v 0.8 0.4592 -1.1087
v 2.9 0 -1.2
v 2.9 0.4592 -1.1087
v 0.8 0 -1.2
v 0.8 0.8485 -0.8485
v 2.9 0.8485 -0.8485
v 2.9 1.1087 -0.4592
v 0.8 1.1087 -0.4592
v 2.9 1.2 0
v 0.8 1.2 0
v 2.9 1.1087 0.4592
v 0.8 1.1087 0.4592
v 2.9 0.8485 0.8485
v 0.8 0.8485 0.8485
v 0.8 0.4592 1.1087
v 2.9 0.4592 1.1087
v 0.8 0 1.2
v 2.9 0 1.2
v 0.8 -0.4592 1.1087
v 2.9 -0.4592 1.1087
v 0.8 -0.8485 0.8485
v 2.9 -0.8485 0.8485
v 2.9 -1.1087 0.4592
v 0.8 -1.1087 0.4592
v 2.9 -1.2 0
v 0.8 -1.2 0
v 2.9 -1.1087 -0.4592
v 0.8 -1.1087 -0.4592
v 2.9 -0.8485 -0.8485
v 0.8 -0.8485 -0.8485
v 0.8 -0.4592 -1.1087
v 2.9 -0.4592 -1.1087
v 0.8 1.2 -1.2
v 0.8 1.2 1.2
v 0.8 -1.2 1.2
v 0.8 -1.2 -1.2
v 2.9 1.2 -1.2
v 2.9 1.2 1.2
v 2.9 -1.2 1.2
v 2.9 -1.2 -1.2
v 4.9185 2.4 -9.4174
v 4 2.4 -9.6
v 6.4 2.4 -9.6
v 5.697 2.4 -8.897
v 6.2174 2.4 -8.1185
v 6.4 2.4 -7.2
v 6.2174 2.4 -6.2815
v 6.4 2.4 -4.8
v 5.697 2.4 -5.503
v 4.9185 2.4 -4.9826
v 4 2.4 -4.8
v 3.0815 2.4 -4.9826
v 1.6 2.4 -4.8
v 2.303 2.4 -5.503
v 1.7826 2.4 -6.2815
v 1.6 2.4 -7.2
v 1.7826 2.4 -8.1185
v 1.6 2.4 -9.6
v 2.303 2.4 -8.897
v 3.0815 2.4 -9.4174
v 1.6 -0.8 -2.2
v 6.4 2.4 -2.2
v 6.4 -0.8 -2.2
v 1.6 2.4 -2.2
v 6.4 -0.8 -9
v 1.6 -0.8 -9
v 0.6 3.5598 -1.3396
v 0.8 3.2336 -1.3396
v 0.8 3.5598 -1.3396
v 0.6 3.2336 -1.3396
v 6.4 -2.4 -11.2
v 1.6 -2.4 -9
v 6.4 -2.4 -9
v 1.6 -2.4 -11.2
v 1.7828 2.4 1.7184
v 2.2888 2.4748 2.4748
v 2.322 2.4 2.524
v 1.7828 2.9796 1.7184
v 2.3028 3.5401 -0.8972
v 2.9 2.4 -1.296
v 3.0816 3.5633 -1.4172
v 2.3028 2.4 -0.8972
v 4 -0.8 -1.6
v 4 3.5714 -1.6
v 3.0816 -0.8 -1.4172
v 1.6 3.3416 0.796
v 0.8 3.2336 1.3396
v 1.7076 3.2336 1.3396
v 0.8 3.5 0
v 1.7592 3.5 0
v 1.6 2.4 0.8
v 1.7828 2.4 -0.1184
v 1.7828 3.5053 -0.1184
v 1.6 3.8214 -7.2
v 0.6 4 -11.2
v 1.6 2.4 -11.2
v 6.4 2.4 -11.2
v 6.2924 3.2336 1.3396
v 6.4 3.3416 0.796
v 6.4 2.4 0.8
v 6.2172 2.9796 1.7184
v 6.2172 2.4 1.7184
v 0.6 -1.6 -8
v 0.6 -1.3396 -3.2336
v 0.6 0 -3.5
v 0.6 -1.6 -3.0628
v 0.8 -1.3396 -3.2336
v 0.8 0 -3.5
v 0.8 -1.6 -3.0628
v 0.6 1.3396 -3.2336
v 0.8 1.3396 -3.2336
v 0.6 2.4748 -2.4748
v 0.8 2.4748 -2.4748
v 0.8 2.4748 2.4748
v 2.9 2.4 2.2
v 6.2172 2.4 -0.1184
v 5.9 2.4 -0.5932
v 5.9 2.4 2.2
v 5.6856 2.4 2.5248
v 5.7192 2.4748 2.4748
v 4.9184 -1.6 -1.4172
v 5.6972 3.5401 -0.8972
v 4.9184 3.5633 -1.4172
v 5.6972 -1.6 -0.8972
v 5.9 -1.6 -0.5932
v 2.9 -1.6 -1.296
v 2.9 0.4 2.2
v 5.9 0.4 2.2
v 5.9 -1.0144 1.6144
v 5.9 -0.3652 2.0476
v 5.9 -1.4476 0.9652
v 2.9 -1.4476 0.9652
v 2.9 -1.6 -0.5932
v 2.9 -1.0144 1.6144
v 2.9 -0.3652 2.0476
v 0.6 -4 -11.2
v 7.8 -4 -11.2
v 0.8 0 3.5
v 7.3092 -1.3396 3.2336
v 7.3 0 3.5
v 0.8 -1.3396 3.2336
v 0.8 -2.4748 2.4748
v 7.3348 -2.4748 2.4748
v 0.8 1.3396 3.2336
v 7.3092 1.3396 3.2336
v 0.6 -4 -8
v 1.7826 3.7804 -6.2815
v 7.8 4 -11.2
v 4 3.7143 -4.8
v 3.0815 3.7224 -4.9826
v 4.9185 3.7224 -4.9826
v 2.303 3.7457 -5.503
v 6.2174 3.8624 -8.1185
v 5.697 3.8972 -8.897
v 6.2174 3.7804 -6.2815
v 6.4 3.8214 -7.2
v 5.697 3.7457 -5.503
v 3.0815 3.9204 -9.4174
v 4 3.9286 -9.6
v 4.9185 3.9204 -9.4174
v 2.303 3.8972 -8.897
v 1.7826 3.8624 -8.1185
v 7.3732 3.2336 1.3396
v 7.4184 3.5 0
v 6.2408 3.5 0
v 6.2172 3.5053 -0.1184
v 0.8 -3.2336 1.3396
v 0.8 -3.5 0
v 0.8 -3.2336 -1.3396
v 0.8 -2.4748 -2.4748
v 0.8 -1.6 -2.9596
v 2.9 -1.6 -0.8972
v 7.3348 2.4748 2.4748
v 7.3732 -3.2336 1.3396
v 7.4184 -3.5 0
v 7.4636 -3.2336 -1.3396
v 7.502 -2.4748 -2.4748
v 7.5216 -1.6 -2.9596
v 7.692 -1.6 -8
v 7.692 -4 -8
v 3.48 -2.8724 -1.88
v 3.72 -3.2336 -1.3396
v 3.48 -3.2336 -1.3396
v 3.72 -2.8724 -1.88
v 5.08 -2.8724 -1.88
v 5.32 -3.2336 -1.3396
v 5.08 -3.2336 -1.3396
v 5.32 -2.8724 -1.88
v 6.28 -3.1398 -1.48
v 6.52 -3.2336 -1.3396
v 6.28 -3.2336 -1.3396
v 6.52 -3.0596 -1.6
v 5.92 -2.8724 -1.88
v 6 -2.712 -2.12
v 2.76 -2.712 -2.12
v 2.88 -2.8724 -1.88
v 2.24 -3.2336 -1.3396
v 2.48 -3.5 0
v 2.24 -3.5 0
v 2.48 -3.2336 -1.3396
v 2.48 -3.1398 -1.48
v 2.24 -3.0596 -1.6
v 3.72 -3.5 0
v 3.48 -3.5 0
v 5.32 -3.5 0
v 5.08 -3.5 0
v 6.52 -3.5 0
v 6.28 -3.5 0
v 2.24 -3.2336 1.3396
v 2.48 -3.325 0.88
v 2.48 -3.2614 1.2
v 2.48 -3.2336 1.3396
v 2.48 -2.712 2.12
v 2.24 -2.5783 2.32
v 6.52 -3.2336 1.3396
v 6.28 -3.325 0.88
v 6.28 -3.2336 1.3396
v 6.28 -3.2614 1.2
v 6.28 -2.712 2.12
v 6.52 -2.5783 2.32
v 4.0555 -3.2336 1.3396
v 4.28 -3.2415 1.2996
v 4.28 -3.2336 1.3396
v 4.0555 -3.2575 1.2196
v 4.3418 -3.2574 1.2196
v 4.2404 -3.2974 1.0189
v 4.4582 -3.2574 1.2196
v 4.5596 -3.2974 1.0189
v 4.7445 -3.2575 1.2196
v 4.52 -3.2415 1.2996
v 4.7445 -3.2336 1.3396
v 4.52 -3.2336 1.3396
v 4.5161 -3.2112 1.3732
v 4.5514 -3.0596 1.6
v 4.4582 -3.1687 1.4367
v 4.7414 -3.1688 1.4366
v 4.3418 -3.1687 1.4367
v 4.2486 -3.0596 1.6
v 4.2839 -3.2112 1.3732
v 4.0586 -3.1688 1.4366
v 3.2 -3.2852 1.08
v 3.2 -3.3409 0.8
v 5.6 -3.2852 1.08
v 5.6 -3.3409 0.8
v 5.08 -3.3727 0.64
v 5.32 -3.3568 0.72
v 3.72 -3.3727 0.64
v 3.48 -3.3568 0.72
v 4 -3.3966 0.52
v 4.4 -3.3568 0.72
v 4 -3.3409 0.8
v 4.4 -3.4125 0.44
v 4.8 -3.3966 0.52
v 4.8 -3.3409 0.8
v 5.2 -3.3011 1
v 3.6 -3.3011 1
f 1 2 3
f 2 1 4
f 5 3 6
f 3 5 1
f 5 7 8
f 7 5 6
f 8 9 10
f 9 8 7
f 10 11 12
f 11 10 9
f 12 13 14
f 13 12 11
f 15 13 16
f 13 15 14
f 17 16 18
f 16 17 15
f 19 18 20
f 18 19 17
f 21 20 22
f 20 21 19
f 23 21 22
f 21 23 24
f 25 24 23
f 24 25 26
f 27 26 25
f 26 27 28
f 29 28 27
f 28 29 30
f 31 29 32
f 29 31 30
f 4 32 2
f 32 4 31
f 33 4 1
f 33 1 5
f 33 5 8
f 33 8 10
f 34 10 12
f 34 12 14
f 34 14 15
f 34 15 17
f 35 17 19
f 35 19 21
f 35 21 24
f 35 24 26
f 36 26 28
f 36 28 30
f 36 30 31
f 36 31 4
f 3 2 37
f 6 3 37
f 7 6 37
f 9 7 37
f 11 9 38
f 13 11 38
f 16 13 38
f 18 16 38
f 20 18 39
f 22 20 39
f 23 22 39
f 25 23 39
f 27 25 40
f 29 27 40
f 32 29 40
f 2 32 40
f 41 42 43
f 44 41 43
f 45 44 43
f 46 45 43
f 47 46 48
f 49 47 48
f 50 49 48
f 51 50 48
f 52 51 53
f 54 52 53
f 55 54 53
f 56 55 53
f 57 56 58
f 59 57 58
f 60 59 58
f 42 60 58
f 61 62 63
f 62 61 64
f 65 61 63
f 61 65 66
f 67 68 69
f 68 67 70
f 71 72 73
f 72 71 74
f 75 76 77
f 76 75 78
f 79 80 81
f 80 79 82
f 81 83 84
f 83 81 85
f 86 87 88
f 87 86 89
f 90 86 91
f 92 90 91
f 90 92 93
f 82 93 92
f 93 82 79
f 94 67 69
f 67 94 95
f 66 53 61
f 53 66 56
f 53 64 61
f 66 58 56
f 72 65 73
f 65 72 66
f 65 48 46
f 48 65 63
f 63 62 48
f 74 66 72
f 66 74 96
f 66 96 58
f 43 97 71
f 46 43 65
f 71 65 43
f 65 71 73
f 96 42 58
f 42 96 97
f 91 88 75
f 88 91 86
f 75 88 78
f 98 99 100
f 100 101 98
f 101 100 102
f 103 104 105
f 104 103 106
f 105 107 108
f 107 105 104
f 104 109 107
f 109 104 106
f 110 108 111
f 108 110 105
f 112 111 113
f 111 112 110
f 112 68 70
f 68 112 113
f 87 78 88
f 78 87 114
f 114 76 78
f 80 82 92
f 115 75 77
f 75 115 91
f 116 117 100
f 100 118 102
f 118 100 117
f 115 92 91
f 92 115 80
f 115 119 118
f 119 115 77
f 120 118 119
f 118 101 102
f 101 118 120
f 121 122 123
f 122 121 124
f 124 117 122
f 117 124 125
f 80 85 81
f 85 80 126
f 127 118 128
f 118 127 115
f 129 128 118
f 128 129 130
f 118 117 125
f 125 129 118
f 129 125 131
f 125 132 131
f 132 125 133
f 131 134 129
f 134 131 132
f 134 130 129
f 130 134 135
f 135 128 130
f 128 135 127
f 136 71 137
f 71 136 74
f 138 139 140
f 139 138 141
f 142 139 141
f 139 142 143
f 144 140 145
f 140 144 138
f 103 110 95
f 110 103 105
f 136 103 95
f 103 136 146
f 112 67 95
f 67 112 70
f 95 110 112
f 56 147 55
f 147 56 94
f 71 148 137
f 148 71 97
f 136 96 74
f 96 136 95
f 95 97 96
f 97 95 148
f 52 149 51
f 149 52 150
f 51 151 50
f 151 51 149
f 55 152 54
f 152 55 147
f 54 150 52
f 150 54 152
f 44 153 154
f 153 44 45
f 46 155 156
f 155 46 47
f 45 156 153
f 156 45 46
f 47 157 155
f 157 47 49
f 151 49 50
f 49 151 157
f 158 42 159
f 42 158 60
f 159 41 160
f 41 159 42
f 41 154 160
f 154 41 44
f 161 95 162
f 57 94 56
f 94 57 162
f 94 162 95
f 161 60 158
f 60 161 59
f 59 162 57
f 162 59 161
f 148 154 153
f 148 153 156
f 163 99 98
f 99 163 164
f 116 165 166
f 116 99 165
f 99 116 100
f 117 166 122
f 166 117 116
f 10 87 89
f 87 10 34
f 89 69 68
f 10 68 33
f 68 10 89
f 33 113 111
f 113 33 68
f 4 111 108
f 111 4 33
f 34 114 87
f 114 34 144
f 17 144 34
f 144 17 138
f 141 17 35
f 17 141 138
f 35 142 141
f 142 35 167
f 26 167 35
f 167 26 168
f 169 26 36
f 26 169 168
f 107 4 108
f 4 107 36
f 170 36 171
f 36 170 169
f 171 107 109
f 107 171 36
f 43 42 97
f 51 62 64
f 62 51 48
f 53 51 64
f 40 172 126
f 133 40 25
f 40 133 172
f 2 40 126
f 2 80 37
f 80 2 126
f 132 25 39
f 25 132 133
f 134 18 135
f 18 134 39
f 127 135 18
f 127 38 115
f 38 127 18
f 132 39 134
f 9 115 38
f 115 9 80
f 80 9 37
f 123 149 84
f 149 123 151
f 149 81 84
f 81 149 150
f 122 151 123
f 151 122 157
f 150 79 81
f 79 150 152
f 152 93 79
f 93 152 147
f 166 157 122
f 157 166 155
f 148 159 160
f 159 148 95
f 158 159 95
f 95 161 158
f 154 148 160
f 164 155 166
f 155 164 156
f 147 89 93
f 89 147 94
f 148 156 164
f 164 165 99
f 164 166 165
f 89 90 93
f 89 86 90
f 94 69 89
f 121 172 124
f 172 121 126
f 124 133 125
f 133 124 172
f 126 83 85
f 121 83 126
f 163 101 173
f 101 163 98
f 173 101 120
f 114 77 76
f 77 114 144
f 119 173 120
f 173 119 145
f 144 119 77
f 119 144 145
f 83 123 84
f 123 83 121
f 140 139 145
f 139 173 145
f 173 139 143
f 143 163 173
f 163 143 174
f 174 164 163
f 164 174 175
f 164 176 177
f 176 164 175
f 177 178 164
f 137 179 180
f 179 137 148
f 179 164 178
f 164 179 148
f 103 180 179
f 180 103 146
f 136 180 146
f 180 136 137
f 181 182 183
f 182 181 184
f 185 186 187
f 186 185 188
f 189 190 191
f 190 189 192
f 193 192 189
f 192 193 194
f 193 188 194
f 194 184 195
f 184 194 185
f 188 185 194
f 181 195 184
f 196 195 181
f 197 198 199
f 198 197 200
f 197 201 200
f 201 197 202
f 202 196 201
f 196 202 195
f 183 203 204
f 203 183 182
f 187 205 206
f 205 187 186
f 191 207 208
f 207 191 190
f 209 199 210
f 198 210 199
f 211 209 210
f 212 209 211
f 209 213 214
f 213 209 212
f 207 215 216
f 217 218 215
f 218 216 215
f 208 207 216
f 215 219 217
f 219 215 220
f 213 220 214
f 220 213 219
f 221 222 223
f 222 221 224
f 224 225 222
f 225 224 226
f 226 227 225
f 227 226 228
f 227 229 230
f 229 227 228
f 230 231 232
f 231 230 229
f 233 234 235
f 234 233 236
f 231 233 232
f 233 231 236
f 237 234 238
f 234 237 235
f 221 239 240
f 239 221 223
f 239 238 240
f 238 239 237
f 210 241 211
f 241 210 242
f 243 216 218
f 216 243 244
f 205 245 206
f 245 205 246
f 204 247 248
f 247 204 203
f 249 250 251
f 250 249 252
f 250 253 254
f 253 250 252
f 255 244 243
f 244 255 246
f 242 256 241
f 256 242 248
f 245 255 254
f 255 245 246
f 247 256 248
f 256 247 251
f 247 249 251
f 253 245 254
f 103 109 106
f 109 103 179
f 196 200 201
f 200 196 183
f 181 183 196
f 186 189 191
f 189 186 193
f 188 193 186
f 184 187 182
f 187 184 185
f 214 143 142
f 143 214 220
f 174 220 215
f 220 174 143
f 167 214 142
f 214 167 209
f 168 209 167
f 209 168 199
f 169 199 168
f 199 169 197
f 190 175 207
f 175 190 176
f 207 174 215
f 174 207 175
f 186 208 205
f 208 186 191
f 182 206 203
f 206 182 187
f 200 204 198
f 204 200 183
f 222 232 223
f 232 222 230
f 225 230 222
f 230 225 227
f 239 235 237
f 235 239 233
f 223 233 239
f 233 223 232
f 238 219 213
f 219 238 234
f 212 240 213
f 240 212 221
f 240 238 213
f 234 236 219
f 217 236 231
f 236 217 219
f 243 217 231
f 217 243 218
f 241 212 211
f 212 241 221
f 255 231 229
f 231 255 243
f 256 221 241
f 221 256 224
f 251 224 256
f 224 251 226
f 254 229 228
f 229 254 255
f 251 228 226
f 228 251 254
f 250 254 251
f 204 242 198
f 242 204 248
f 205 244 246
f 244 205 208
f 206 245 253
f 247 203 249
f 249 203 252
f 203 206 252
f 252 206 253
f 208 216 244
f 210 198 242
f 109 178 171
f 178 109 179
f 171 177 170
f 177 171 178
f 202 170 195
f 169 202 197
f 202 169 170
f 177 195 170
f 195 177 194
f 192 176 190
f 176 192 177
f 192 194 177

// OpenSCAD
use <../lib.scad>
use <s/3817bs01.scad>
$fa=1; $fs=0.2;
function ldraw_lib__3817bpa3(realsolid=false) = [
// 0 Minifig Leg Left with Buttoned Cargo Pocket Pattern
// 0 Name: 3817bpa3.dat
// 0 Author: Magnus Forsberg [MagFors]
// 0 !LDRAW_ORG Part UPDATE 2020-03
// 0 !LICENSE Licensed under CC BY 2.0 and CC BY 4.0 : see CAreadme.txt
// 
// 0 BFC CERTIFY CCW
  [0,"BFC","CERTIFY"],
  [0,"BFC","CCW"],
// 
// 0 !KEYWORDS Bricklink 970c00pb0018, Johnny Thunder
// 
// 0 !CMDLINE -c19
// 
// 0 !HISTORY 2009-12-29 [westrate] Original design as 3817pa3
// 0 !HISTORY 2020-06-27 [MagFors] Adapted to corrected geometry
// 0 !HISTORY 2020-12-29 [PTadmin] Official Update 2020-03
// 
// 
// 1 16 0 0 0 1 0 0 0 1 0 0 0 1 s\3817bs01.dat
  [1,16,0,0,0,1,0,0,0,1,0,0,0,1, ldraw_lib__s__3817bs01(realsolid)],
// 4 16 1.5 20 -4 1.5 20 -10 19.23 20 -10 19.23 20 -4
  [4,16,1.5,20,-4,1.5,20,-10,19.23,20,-10,19.23,20,-4],
// 4 16 1.5 20 -10 1.5 28 -10 19.5 28 -10 19.23 20 -10
  [4,16,1.5,20,-10,1.5,28,-10,19.5,28,-10,19.23,20,-10],
// 5 24 2 3.349 -8.084 18.659 3.349 -8.084 2 0 -8.75 2 6.187 -6.187
  [5,24,2,3.349,-8.084,18.659,3.349,-8.084,2,0,-8.75,2,6.187,-6.187],
// 5 24 2 6.187 -6.187 18.755 6.187 -6.187 2 7.399 -4 2 3.349 -8.084
  [5,24,2,6.187,-6.187,18.755,6.187,-6.187,2,7.399,-4,2,3.349,-8.084],
// 5 24 2 0 -8.75 18.546 0 -8.75 2 3.349 -8.084 2 -3.349 -8.084
  [5,24,2,0,-8.75,18.546,0,-8.75,2,3.349,-8.084,2,-3.349,-8.084],
// 5 24 2 -3.349 -8.084 18.433 -3.349 -8.084 2 0 -8.75 2 -6.187 -6.187
  [5,24,2,-3.349,-8.084,18.433,-3.349,-8.084,2,0,-8.75,2,-6.187,-6.187],
// 
// 4 0 9.3 3.349 -8.084 8.7 3.349 -8.084 8.7 4.7 -7.181 9.3 4.7 -7.181
  [4,0,9.3,3.349,-8.084,8.7,3.349,-8.084,8.7,4.7,-7.181,9.3,4.7,-7.181],
// 4 0 13.3 4.7 -7.181 13.3 3.349 -8.084 12.7 3.349 -8.084 12.7 4.7 -7.181
  [4,0,13.3,4.7,-7.181,13.3,3.349,-8.084,12.7,3.349,-8.084,12.7,4.7,-7.181],
// 4 0 15.7 3.349 -8.084 15.7 3.7 -7.8494 16.3 4 -7.6489 16.3 3.349 -8.084
  [4,0,15.7,3.349,-8.084,15.7,3.7,-7.8494,16.3,4,-7.6489,16.3,3.349,-8.084],
// 4 0 14.8 4.7 -7.181 15 5.3 -6.7799 16.3 4 -7.6489 15.7 3.7 -7.8494
  [4,0,14.8,4.7,-7.181,15,5.3,-6.7799,16.3,4,-7.6489,15.7,3.7,-7.8494],
// 3 0 14.8 4.7 -7.181 13.3 4.7 -7.181 15 5.3 -6.7799
  [3,0,14.8,4.7,-7.181,13.3,4.7,-7.181,15,5.3,-6.7799],
// 4 0 6.9 5.3 -6.7799 15 5.3 -6.7799 12.7 4.7 -7.181 9.3 4.7 -7.181
  [4,0,6.9,5.3,-6.7799,15,5.3,-6.7799,12.7,4.7,-7.181,9.3,4.7,-7.181],
// 3 0 13.3 4.7 -7.181 12.7 4.7 -7.181 15 5.3 -6.7799
  [3,0,13.3,4.7,-7.181,12.7,4.7,-7.181,15,5.3,-6.7799],
// 3 0 8.7 4.7 -7.181 6.9 5.3 -6.7799 9.3 4.7 -7.181
  [3,0,8.7,4.7,-7.181,6.9,5.3,-6.7799,9.3,4.7,-7.181],
// 3 0 7.2 4.7 -7.181 6.9 5.3 -6.7799 8.7 4.7 -7.181
  [3,0,7.2,4.7,-7.181,6.9,5.3,-6.7799,8.7,4.7,-7.181],
// 4 0 5.6 0 -8.75 5.6 3.349 -8.084 6.2 3.349 -8.084 6.2 0 -8.75
  [4,0,5.6,0,-8.75,5.6,3.349,-8.084,6.2,3.349,-8.084,6.2,0,-8.75],
// 4 0 5.6 4 -7.6489 6.2 3.7 -7.8494 6.2 3.349 -8.084 5.6 3.349 -8.084
  [4,0,5.6,4,-7.6489,6.2,3.7,-7.8494,6.2,3.349,-8.084,5.6,3.349,-8.084],
// 4 0 7.2 4.7 -7.181 6.2 3.7 -7.8494 5.6 4 -7.6489 6.9 5.3 -6.7799
  [4,0,7.2,4.7,-7.181,6.2,3.7,-7.8494,5.6,4,-7.6489,6.9,5.3,-6.7799],
// 4 0 8.7 0 -8.75 8.7 3.349 -8.084 9.3 3.349 -8.084 9.3 0 -8.75
  [4,0,8.7,0,-8.75,8.7,3.349,-8.084,9.3,3.349,-8.084,9.3,0,-8.75],
// 4 0 13.3 3.349 -8.084 13.3 0 -8.75 12.7 0 -8.75 12.7 3.349 -8.084
  [4,0,13.3,3.349,-8.084,13.3,0,-8.75,12.7,0,-8.75,12.7,3.349,-8.084],
// 4 0 15.7 3.349 -8.084 16.3 3.349 -8.084 16.3 0 -8.75 15.7 0 -8.75
  [4,0,15.7,3.349,-8.084,16.3,3.349,-8.084,16.3,0,-8.75,15.7,0,-8.75],
// 3 0 5.6 -3.349 -8.084 5.6 0 -8.75 6.2 -2.2 -8.3125
  [3,0,5.6,-3.349,-8.084,5.6,0,-8.75,6.2,-2.2,-8.3125],
// 3 0 6.2 0 -8.75 6.2 -2.2 -8.3125 5.6 0 -8.75
  [3,0,6.2,0,-8.75,6.2,-2.2,-8.3125,5.6,0,-8.75],
// 3 0 6.2 -3 -8.1534 5.6 -3.349 -8.084 6.2 -2.2 -8.3125
  [3,0,6.2,-3,-8.1534,5.6,-3.349,-8.084,6.2,-2.2,-8.3125],
// 3 0 6.2 -3.349 -8.084 5.6 -3.349 -8.084 6.2 -3 -8.1534
  [3,0,6.2,-3.349,-8.084,5.6,-3.349,-8.084,6.2,-3,-8.1534],
// 4 0 5.6 -5.8 -6.4457 5.6 -3.349 -8.084 6.2 -3.349 -8.084 6.2 -5.3 -6.7799
  [4,0,5.6,-5.8,-6.4457,5.6,-3.349,-8.084,6.2,-3.349,-8.084,6.2,-5.3,-6.7799],
// 3 0 16.3 0 -8.75 16.3 -3.349 -8.084 15.7 -2.2 -8.3125
  [3,0,16.3,0,-8.75,16.3,-3.349,-8.084,15.7,-2.2,-8.3125],
// 3 0 15.7 -3.349 -8.084 15.7 -3 -8.1534 16.3 -3.349 -8.084
  [3,0,15.7,-3.349,-8.084,15.7,-3,-8.1534,16.3,-3.349,-8.084],
// 3 0 15.7 -3 -8.1534 15.7 -2.2 -8.3125 16.3 -3.349 -8.084
  [3,0,15.7,-3,-8.1534,15.7,-2.2,-8.3125,16.3,-3.349,-8.084],
// 3 0 15.7 0 -8.75 16.3 0 -8.75 15.7 -2.2 -8.3125
  [3,0,15.7,0,-8.75,16.3,0,-8.75,15.7,-2.2,-8.3125],
// 4 0 16.3 -3.349 -8.084 16.3 -5.8 -6.4457 15.7 -5.3 -6.7799 15.7 -3.349 -8.084
  [4,0,16.3,-3.349,-8.084,16.3,-5.8,-6.4457,15.7,-5.3,-6.7799,15.7,-3.349,-8.084],
// 4 0 6.2 -5.3 -6.7799 15.7 -5.3 -6.7799 16.3 -5.8 -6.4457 5.6 -5.8 -6.4457
  [4,0,6.2,-5.3,-6.7799,15.7,-5.3,-6.7799,16.3,-5.8,-6.4457,5.6,-5.8,-6.4457],
// 4 0 10.7 -3.349 -8.084 10.1387 -3.349 -8.084 10.1387 -3.049 -8.1437 10.7 -3.249 -8.1038
  [4,0,10.7,-3.349,-8.084,10.1387,-3.349,-8.084,10.1387,-3.049,-8.1437,10.7,-3.249,-8.1038],
// 4 0 10.7 -3.249 -8.1038 10.1387 -3.049 -8.1437 10.601 -2.5472 -8.2435 10.8545 -3.049 -8.1436
  [4,0,10.7,-3.249,-8.1038,10.1387,-3.049,-8.1437,10.601,-2.5472,-8.2435,10.8545,-3.049,-8.1436],
// 4 0 10.8545 -3.049 -8.1436 10.601 -2.5472 -8.2435 11.399 -2.5472 -8.2435 11.1455 -3.049 -8.1436
  [4,0,10.8545,-3.049,-8.1436,10.601,-2.5472,-8.2435,11.399,-2.5472,-8.2435,11.1455,-3.049,-8.1436],
// 4 0 11.1455 -3.049 -8.1436 11.399 -2.5472 -8.2435 11.8613 -3.049 -8.1437 11.3 -3.249 -8.1038
  [4,0,11.1455,-3.049,-8.1436,11.399,-2.5472,-8.2435,11.8613,-3.049,-8.1437,11.3,-3.249,-8.1038],
// 4 0 11.8613 -3.349 -8.084 11.3 -3.349 -8.084 11.3 -3.249 -8.1038 11.8613 -3.049 -8.1437
  [4,0,11.8613,-3.349,-8.084,11.3,-3.349,-8.084,11.3,-3.249,-8.1038,11.8613,-3.049,-8.1437],
// 4 0 11.2902 -3.4329 -8.0279 11.8536 -3.5914 -7.922 11.3784 -4 -7.6489 11.1455 -3.5917 -7.9218
  [4,0,11.2902,-3.4329,-8.0279,11.8536,-3.5914,-7.922,11.3784,-4,-7.6489,11.1455,-3.5917,-7.9218],
// 4 0 11.8536 -3.5914 -7.922 11.2902 -3.4329 -8.0279 11.3 -3.349 -8.084 11.8613 -3.349 -8.084
  [4,0,11.8536,-3.5914,-7.922,11.2902,-3.4329,-8.0279,11.3,-3.349,-8.084,11.8613,-3.349,-8.084],
// 4 0 11.1455 -3.5917 -7.9218 11.3784 -4 -7.6489 10.6216 -4 -7.6489 10.8545 -3.5917 -7.9218
  [4,0,11.1455,-3.5917,-7.9218,11.3784,-4,-7.6489,10.6216,-4,-7.6489,10.8545,-3.5917,-7.9218],
// 4 0 10.1464 -3.5914 -7.922 10.1387 -3.349 -8.084 10.7 -3.349 -8.084 10.7098 -3.4329 -8.0279
  [4,0,10.1464,-3.5914,-7.922,10.1387,-3.349,-8.084,10.7,-3.349,-8.084,10.7098,-3.4329,-8.0279],
// 4 0 10.6216 -4 -7.6489 10.1464 -3.5914 -7.922 10.7098 -3.4329 -8.0279 10.8545 -3.5917 -7.9218
  [4,0,10.6216,-4,-7.6489,10.1464,-3.5914,-7.922,10.7098,-3.4329,-8.0279,10.8545,-3.5917,-7.9218],
// 4 0 6.2 -2.2 -8.3125 8 -2 -8.3523 8 -2.7 -8.2131 6.2 -3 -8.1534
  [4,0,6.2,-2.2,-8.3125,8,-2,-8.3523,8,-2.7,-8.2131,6.2,-3,-8.1534],
// 4 0 14 -2.7 -8.2131 14 -2 -8.3523 15.7 -2.2 -8.3125 15.7 -3 -8.1534
  [4,0,14,-2.7,-8.2131,14,-2,-8.3523,15.7,-2.2,-8.3125,15.7,-3,-8.1534],
// 4 0 13.3 -1.8 -8.392 12.7 -1.6 -8.4318 12.7 0 -8.75 13.3 0 -8.75
  [4,0,13.3,-1.8,-8.392,12.7,-1.6,-8.4318,12.7,0,-8.75,13.3,0,-8.75],
// 4 0 8.7 0 -8.75 9.3 0 -8.75 9.3 -1.6 -8.4318 8.7 -1.8 -8.392
  [4,0,8.7,0,-8.75,9.3,0,-8.75,9.3,-1.6,-8.4318,8.7,-1.8,-8.392],
// 4 0 10 -1.3 -8.4915 11 -1.1 -8.5312 11 -1.8 -8.392 10 -2 -8.3523
  [4,0,10,-1.3,-8.4915,11,-1.1,-8.5312,11,-1.8,-8.392,10,-2,-8.3523],
// 4 0 11 -1.8 -8.392 11 -1.1 -8.5312 12 -1.3 -8.4915 12 -2 -8.3523
  [4,0,11,-1.8,-8.392,11,-1.1,-8.5312,12,-1.3,-8.4915,12,-2,-8.3523],
// 4 0 13 -2.5 -8.2528 13.3 -1.8 -8.392 14 -2 -8.3523 14 -2.7 -8.2131
  [4,0,13,-2.5,-8.2528,13.3,-1.8,-8.392,14,-2,-8.3523,14,-2.7,-8.2131],
// 4 0 8 -2 -8.3523 8.7 -1.8 -8.392 9 -2.5 -8.2528 8 -2.7 -8.2131
  [4,0,8,-2,-8.3523,8.7,-1.8,-8.392,9,-2.5,-8.2528,8,-2.7,-8.2131],
// 4 0 12 -2 -8.3523 12.7 -1.6 -8.4318 13.3 -1.8 -8.392 13 -2.5 -8.2528
  [4,0,12,-2,-8.3523,12.7,-1.6,-8.4318,13.3,-1.8,-8.392,13,-2.5,-8.2528],
// 4 0 8.7 -1.8 -8.392 9.3 -1.6 -8.4318 10 -2 -8.3523 9 -2.5 -8.2528
  [4,0,8.7,-1.8,-8.392,9.3,-1.6,-8.4318,10,-2,-8.3523,9,-2.5,-8.2528],
// 3 0 9.3 -1.6 -8.4318 10 -1.3 -8.4915 10 -2 -8.3523
  [3,0,9.3,-1.6,-8.4318,10,-1.3,-8.4915,10,-2,-8.3523],
// 3 0 12 -1.3 -8.4915 12.7 -1.6 -8.4318 12 -2 -8.3523
  [3,0,12,-1.3,-8.4915,12.7,-1.6,-8.4318,12,-2,-8.3523],
// 4 16 1.5 20 -4 19.23 20 -4 2 7.657 -4 1.5 7.657 -4
  [4,16,1.5,20,-4,19.23,20,-4,2,7.657,-4,1.5,7.657,-4],
// 4 16 6.2 3.349 -8.084 6.2 3.7 -7.8494 7.2 4.7 -7.181 8.7 3.349 -8.084
  [4,16,6.2,3.349,-8.084,6.2,3.7,-7.8494,7.2,4.7,-7.181,8.7,3.349,-8.084],
// 3 16 8.7 4.7 -7.181 8.7 3.349 -8.084 7.2 4.7 -7.181
  [3,16,8.7,4.7,-7.181,8.7,3.349,-8.084,7.2,4.7,-7.181],
// 4 16 14.8 4.7 -7.181 15.7 3.7 -7.8494 15.7 3.349 -8.084 13.3 3.349 -8.084
  [4,16,14.8,4.7,-7.181,15.7,3.7,-7.8494,15.7,3.349,-8.084,13.3,3.349,-8.084],
// 3 16 13.3 4.7 -7.181 14.8 4.7 -7.181 13.3 3.349 -8.084
  [3,16,13.3,4.7,-7.181,14.8,4.7,-7.181,13.3,3.349,-8.084],
// 4 16 12.7 3.349 -8.084 9.3 3.349 -8.084 9.3 4.7 -7.181 12.7 4.7 -7.181
  [4,16,12.7,3.349,-8.084,9.3,3.349,-8.084,9.3,4.7,-7.181,12.7,4.7,-7.181],
// 4 16 2 -6.187 -6.187 5.6 -5.8 -6.4457 16.3 -5.8 -6.4457 18.337 -6.187 -6.187
  [4,16,2,-6.187,-6.187,5.6,-5.8,-6.4457,16.3,-5.8,-6.4457,18.337,-6.187,-6.187],
// 4 16 16.3 -5.8 -6.4457 16.3 -3.349 -8.084 18.433 -3.349 -8.084 18.337 -6.187 -6.187
  [4,16,16.3,-5.8,-6.4457,16.3,-3.349,-8.084,18.433,-3.349,-8.084,18.337,-6.187,-6.187],
// 4 16 2 -3.349 -8.084 5.6 -3.349 -8.084 5.6 -5.8 -6.4457 2 -6.187 -6.187
  [4,16,2,-3.349,-8.084,5.6,-3.349,-8.084,5.6,-5.8,-6.4457,2,-6.187,-6.187],
// 4 16 5.6 0 -8.75 5.6 -3.349 -8.084 2 -3.349 -8.084 2 0 -8.75
  [4,16,5.6,0,-8.75,5.6,-3.349,-8.084,2,-3.349,-8.084,2,0,-8.75],
// 4 16 5.6 3.349 -8.084 5.6 0 -8.75 2 0 -8.75 2 3.349 -8.084
  [4,16,5.6,3.349,-8.084,5.6,0,-8.75,2,0,-8.75,2,3.349,-8.084],
// 4 16 16.3 3.349 -8.084 18.659 3.349 -8.084 18.546 0 -8.75 16.3 0 -8.75
  [4,16,16.3,3.349,-8.084,18.659,3.349,-8.084,18.546,0,-8.75,16.3,0,-8.75],
// 4 16 16.3 0 -8.75 18.546 0 -8.75 18.433 -3.349 -8.084 16.3 -3.349 -8.084
  [4,16,16.3,0,-8.75,18.546,0,-8.75,18.433,-3.349,-8.084,16.3,-3.349,-8.084],
// 4 16 13.3 3.349 -8.084 15.7 3.349 -8.084 15.7 0 -8.75 13.3 0 -8.75
  [4,16,13.3,3.349,-8.084,15.7,3.349,-8.084,15.7,0,-8.75,13.3,0,-8.75],
// 4 16 9.3 3.349 -8.084 12.7 3.349 -8.084 12.7 0 -8.75 9.3 0 -8.75
  [4,16,9.3,3.349,-8.084,12.7,3.349,-8.084,12.7,0,-8.75,9.3,0,-8.75],
// 4 16 6.2 3.349 -8.084 8.7 3.349 -8.084 8.7 0 -8.75 6.2 0 -8.75
  [4,16,6.2,3.349,-8.084,8.7,3.349,-8.084,8.7,0,-8.75,6.2,0,-8.75],
// 4 16 10.7 -3.249 -8.1038 11.3 -3.249 -8.1038 11.3 -3.349 -8.084 10.7 -3.349 -8.084
  [4,16,10.7,-3.249,-8.1038,11.3,-3.249,-8.1038,11.3,-3.349,-8.084,10.7,-3.349,-8.084],
// 4 16 10.7 -3.249 -8.1038 10.8545 -3.049 -8.1436 11.1455 -3.049 -8.1436 11.3 -3.249 -8.1038
  [4,16,10.7,-3.249,-8.1038,10.8545,-3.049,-8.1436,11.1455,-3.049,-8.1436,11.3,-3.249,-8.1038],
// 4 16 11.1455 -3.5917 -7.9218 10.8545 -3.5917 -7.9218 10.7098 -3.4329 -8.0279 11.2902 -3.4329 -8.0279
  [4,16,11.1455,-3.5917,-7.9218,10.8545,-3.5917,-7.9218,10.7098,-3.4329,-8.0279,11.2902,-3.4329,-8.0279],
// 4 16 10.7 -3.349 -8.084 11.3 -3.349 -8.084 11.2902 -3.4329 -8.0279 10.7098 -3.4329 -8.0279
  [4,16,10.7,-3.349,-8.084,11.3,-3.349,-8.084,11.2902,-3.4329,-8.0279,10.7098,-3.4329,-8.0279],
// 4 16 10.6216 -4 -7.6489 11.3784 -4 -7.6489 15.7 -5.3 -6.7799 6.2 -5.3 -6.7799
  [4,16,10.6216,-4,-7.6489,11.3784,-4,-7.6489,15.7,-5.3,-6.7799,6.2,-5.3,-6.7799],
// 4 16 10.1387 -3.349 -8.084 10.1464 -3.5914 -7.922 6.2 -5.3 -6.7799 6.2 -3.349 -8.084
  [4,16,10.1387,-3.349,-8.084,10.1464,-3.5914,-7.922,6.2,-5.3,-6.7799,6.2,-3.349,-8.084],
// 3 16 10.1464 -3.5914 -7.922 10.6216 -4 -7.6489 6.2 -5.3 -6.7799
  [3,16,10.1464,-3.5914,-7.922,10.6216,-4,-7.6489,6.2,-5.3,-6.7799],
// 3 16 11.3784 -4 -7.6489 11.8536 -3.5914 -7.922 15.7 -5.3 -6.7799
  [3,16,11.3784,-4,-7.6489,11.8536,-3.5914,-7.922,15.7,-5.3,-6.7799],
// 4 16 11.8613 -3.349 -8.084 15.7 -3.349 -8.084 15.7 -5.3 -6.7799 11.8536 -3.5914 -7.922
  [4,16,11.8613,-3.349,-8.084,15.7,-3.349,-8.084,15.7,-5.3,-6.7799,11.8536,-3.5914,-7.922],
// 4 16 14 -2.7 -8.2131 15.7 -3 -8.1534 15.7 -3.349 -8.084 11.8613 -3.349 -8.084
  [4,16,14,-2.7,-8.2131,15.7,-3,-8.1534,15.7,-3.349,-8.084,11.8613,-3.349,-8.084],
// 4 16 10.1387 -3.349 -8.084 6.2 -3.349 -8.084 6.2 -3 -8.1534 8 -2.7 -8.2131
  [4,16,10.1387,-3.349,-8.084,6.2,-3.349,-8.084,6.2,-3,-8.1534,8,-2.7,-8.2131],
// 4 16 14 -2.7 -8.2131 11.8613 -3.349 -8.084 11.8613 -3.049 -8.1437 13 -2.5 -8.2528
  [4,16,14,-2.7,-8.2131,11.8613,-3.349,-8.084,11.8613,-3.049,-8.1437,13,-2.5,-8.2528],
// 4 16 9 -2.5 -8.2528 10.1387 -3.049 -8.1437 10.1387 -3.349 -8.084 8 -2.7 -8.2131
  [4,16,9,-2.5,-8.2528,10.1387,-3.049,-8.1437,10.1387,-3.349,-8.084,8,-2.7,-8.2131],
// 4 16 10.601 -2.5472 -8.2435 10.1387 -3.049 -8.1437 9 -2.5 -8.2528 10 -2 -8.3523
  [4,16,10.601,-2.5472,-8.2435,10.1387,-3.049,-8.1437,9,-2.5,-8.2528,10,-2,-8.3523],
// 4 16 11.399 -2.5472 -8.2435 12 -2 -8.3523 13 -2.5 -8.2528 11.8613 -3.049 -8.1437
  [4,16,11.399,-2.5472,-8.2435,12,-2,-8.3523,13,-2.5,-8.2528,11.8613,-3.049,-8.1437],
// 4 16 11.399 -2.5472 -8.2435 10.601 -2.5472 -8.2435 10 -2 -8.3523 12 -2 -8.3523
  [4,16,11.399,-2.5472,-8.2435,10.601,-2.5472,-8.2435,10,-2,-8.3523,12,-2,-8.3523],
// 3 16 11 -1.8 -8.392 12 -2 -8.3523 10 -2 -8.3523
  [3,16,11,-1.8,-8.392,12,-2,-8.3523,10,-2,-8.3523],
// 4 16 8.7 0 -8.75 8.7 -1.8 -8.392 8 -2 -8.3523 6.2 0 -8.75
  [4,16,8.7,0,-8.75,8.7,-1.8,-8.392,8,-2,-8.3523,6.2,0,-8.75],
// 4 16 13.3 -1.8 -8.392 13.3 0 -8.75 15.7 0 -8.75 14 -2 -8.3523
  [4,16,13.3,-1.8,-8.392,13.3,0,-8.75,15.7,0,-8.75,14,-2,-8.3523],
// 3 16 12.7 0 -8.75 12.7 -1.6 -8.4318 12 -1.3 -8.4915
  [3,16,12.7,0,-8.75,12.7,-1.6,-8.4318,12,-1.3,-8.4915],
// 3 16 9.3 -1.6 -8.4318 9.3 0 -8.75 10 -1.3 -8.4915
  [3,16,9.3,-1.6,-8.4318,9.3,0,-8.75,10,-1.3,-8.4915],
// 3 16 10 -1.3 -8.4915 9.3 0 -8.75 11 -1.1 -8.5312
  [3,16,10,-1.3,-8.4915,9.3,0,-8.75,11,-1.1,-8.5312],
// 3 16 9.3 0 -8.75 12.7 0 -8.75 11 -1.1 -8.5312
  [3,16,9.3,0,-8.75,12.7,0,-8.75,11,-1.1,-8.5312],
// 3 16 11 -1.1 -8.5312 12.7 0 -8.75 12 -1.3 -8.4915
  [3,16,11,-1.1,-8.5312,12.7,0,-8.75,12,-1.3,-8.4915],
// 3 16 15.7 0 -8.75 15.7 -2.2 -8.3125 14 -2 -8.3523
  [3,16,15.7,0,-8.75,15.7,-2.2,-8.3125,14,-2,-8.3523],
// 3 16 6.2 -2.2 -8.3125 6.2 0 -8.75 8 -2 -8.3523
  [3,16,6.2,-2.2,-8.3125,6.2,0,-8.75,8,-2,-8.3523],
// 4 16 2 7.399 -4 2 7.657 -4 19.23 20 -4 18.804 7.399 -4
  [4,16,2,7.399,-4,2,7.657,-4,19.23,20,-4,18.804,7.399,-4],
// 4 16 2 6.187 -6.187 2 7.399 -4 18.804 7.399 -4 18.755 6.187 -6.187
  [4,16,2,6.187,-6.187,2,7.399,-4,18.804,7.399,-4,18.755,6.187,-6.187],
// 3 16 5.6 4 -7.6489 2 6.187 -6.187 6.9 5.3 -6.7799
  [3,16,5.6,4,-7.6489,2,6.187,-6.187,6.9,5.3,-6.7799],
// 4 16 5.6 3.349 -8.084 2 3.349 -8.084 2 6.187 -6.187 5.6 4 -7.6489
  [4,16,5.6,3.349,-8.084,2,3.349,-8.084,2,6.187,-6.187,5.6,4,-7.6489],
// 4 16 18.755 6.187 -6.187 15 5.3 -6.7799 6.9 5.3 -6.7799 2 6.187 -6.187
  [4,16,18.755,6.187,-6.187,15,5.3,-6.7799,6.9,5.3,-6.7799,2,6.187,-6.187],
// 4 16 18.659 3.349 -8.084 16.3 3.349 -8.084 16.3 4 -7.6489 18.755 6.187 -6.187
  [4,16,18.659,3.349,-8.084,16.3,3.349,-8.084,16.3,4,-7.6489,18.755,6.187,-6.187],
// 3 16 16.3 4 -7.6489 15 5.3 -6.7799 18.755 6.187 -6.187
  [3,16,16.3,4,-7.6489,15,5.3,-6.7799,18.755,6.187,-6.187],
];
module ldraw_lib__3817bpa3(step=0, col=false, unit=2/5, alt=false, line=0.2, solid=!$preview)
    makepoly(ldraw_lib__3817bpa3(solid), step=step, col=col, unit=unit, alt=alt, line=line, solid=solid);
ldraw_lib__3817bpa3(line=0.2);
